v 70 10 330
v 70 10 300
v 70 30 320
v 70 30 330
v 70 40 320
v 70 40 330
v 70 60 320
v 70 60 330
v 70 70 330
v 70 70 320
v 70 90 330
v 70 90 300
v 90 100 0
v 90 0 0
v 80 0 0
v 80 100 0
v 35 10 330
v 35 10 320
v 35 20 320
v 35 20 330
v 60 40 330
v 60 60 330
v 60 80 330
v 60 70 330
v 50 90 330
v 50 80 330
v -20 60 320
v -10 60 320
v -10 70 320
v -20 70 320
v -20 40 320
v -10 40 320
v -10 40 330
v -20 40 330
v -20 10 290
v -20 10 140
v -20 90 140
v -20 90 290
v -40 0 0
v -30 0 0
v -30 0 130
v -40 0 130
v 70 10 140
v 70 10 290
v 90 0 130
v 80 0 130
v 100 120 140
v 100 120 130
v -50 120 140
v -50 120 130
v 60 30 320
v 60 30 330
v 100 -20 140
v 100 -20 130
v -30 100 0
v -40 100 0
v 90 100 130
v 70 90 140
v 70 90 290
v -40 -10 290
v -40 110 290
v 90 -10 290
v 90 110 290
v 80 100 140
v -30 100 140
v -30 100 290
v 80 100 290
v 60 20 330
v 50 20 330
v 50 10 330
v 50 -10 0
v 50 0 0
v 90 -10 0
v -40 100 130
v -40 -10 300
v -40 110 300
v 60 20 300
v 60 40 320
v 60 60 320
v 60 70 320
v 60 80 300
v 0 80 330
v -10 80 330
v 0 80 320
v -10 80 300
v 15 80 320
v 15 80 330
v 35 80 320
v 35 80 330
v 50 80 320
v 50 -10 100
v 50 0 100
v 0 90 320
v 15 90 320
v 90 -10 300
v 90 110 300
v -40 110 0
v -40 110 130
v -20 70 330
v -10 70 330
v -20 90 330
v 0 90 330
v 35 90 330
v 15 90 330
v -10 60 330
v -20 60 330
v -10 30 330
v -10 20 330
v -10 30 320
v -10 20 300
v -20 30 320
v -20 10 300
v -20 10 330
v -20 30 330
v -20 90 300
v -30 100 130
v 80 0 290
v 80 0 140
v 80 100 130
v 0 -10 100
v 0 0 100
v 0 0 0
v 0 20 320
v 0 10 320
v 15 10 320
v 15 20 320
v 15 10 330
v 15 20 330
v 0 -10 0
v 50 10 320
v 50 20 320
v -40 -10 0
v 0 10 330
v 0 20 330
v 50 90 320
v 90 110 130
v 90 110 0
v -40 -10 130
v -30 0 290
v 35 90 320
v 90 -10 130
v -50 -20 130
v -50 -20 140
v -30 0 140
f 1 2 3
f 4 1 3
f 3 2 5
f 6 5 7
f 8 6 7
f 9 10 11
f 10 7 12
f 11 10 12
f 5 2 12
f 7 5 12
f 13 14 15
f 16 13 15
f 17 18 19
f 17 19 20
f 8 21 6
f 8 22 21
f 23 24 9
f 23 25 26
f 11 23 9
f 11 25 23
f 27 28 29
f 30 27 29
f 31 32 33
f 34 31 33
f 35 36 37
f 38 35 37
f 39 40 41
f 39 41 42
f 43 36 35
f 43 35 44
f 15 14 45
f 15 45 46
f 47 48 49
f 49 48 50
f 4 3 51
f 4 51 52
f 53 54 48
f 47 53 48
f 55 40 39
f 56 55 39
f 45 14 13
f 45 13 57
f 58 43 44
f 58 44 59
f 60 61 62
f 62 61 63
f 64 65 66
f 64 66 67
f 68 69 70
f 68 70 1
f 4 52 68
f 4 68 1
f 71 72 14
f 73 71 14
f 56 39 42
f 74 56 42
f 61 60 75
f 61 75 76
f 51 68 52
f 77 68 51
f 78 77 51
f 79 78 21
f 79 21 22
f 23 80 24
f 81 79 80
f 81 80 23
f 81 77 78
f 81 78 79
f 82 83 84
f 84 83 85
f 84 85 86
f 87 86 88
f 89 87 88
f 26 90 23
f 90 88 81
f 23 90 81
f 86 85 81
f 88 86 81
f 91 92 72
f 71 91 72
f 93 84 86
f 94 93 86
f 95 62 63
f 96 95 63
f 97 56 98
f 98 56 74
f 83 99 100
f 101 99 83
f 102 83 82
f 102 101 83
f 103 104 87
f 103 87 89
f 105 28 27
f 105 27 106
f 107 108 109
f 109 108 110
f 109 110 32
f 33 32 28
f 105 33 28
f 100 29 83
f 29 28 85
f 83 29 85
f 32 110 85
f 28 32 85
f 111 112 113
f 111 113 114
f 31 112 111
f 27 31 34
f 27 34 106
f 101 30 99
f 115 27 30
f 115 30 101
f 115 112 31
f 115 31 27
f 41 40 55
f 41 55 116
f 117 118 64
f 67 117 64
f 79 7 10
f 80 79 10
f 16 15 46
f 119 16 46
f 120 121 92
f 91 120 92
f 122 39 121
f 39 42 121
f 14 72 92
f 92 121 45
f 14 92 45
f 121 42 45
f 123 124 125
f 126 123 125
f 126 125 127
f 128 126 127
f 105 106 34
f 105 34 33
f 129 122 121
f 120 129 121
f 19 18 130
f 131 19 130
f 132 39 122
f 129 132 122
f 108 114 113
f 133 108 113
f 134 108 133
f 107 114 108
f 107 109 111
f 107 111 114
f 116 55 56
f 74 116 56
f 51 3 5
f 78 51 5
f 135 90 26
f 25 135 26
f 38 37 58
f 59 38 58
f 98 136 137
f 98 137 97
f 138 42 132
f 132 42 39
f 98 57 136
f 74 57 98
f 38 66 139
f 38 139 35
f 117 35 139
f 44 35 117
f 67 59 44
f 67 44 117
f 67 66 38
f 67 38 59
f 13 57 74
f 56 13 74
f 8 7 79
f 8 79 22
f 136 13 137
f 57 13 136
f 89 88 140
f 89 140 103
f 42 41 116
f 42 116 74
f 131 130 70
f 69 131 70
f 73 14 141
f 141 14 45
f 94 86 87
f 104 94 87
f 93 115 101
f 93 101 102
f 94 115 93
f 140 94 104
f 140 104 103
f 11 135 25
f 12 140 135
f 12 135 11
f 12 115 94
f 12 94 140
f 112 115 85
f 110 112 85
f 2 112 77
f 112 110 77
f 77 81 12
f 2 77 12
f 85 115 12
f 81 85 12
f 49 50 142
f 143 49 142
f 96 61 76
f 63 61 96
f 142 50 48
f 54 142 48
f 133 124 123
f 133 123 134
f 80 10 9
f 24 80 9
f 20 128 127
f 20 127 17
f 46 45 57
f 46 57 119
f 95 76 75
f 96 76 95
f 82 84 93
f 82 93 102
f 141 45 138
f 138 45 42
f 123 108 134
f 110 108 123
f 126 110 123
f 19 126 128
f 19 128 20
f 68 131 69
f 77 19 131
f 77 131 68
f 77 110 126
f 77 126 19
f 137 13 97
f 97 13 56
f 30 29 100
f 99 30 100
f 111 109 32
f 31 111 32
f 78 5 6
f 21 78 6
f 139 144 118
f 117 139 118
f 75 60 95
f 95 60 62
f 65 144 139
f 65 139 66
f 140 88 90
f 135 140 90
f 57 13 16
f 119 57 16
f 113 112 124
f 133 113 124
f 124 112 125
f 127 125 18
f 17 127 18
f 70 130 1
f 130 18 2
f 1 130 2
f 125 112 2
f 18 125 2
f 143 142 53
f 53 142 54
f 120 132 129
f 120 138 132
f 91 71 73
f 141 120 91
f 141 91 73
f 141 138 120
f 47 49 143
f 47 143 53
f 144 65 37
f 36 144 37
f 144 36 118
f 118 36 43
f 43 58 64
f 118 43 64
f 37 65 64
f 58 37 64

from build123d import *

# Parameters (mm, degrees)
F1_DEPTH  = 10
F2_W      = 10
F2_H      = 130
F3_DEPTH  = 100
F4_W      = 130
F4_H      = 130
F5_DEPTH  = 10
F7_DEPTH  = 10
F8_W      = 110
F8_H      = 100
F8_W_2    = 90
F8_H_2    = 80
F9_DEPTH  = 150
F10_W     = 130
F10_H     = 120
F11_DEPTH = 10
F12_W     = 90
F12_H     = 80
F12_W_2   = 70
F12_H_2   = 60
F13_DEPTH = 30
F14_W     = 15
F14_H     = 10
F15_DEPTH = 110.001
F16_W     = 10
F16_H     = 10
F17_DEPTH = 120.001


with BuildPart() as f1:
    # F0 (on Front) → F1 (new body)
    with BuildSketch(Plane.XZ):
        Polygon((-40, 0), (0, 0), (0, 100), (50, 100), (50, 0), (90, 0), (90, 130), (-40, 130), align=None)
    extrude(amount=F1_DEPTH)


with BuildPart() as f3:
    # F2 (on face) → F3 (new body)
    with BuildSketch(Plane(origin=(0, 0, 0), x_dir=(-1, 0, 0), z_dir=(0, 1, 0))):
        with Locations((-85, 65)):
            Rectangle(F2_W, F2_H)
        with Locations((35, 65)):
            Rectangle(F2_W, F2_H)
    extrude(amount=F3_DEPTH)


with BuildPart() as f5:
    # F4 (on face) → F5 (new body)
    with BuildSketch(Plane(origin=(0, 100, 0), x_dir=(-1, 0, 0), z_dir=(0, 1, 0))):
        with Locations((-25, 65)):
            Rectangle(F4_W, F4_H)
    extrude(amount=F5_DEPTH)


with BuildPart() as f7:
    # F6 (on face) → F7 (new body)
    with BuildSketch(Plane.XY.offset(130)):
        Polygon((100, 120), (-50, 120), (-50, 100), (-50, 0), (-50, -20), (100, -20), (100, 0), (100, 100), align=None)
    extrude(amount=F7_DEPTH)


with BuildPart() as f9:
    # F8 (on face) → F9 (new body)
    with BuildSketch(Plane.XY.offset(140)):
        with Locations((25, 50)):
            Rectangle(F8_W, F8_H)
        with Locations((25, 50)):
            Rectangle(F8_W_2, F8_H_2, mode=Mode.SUBTRACT)
    extrude(amount=F9_DEPTH)


with BuildPart() as f11:
    # F10 (on face) → F11 (new body)
    with BuildSketch(Plane.XY.offset(290)):
        with Locations((25, 50)):
            Rectangle(F10_W, F10_H)
    extrude(amount=F11_DEPTH)


with BuildPart() as f13:
    # F12 (on face) → F13 (new body)
    with BuildSketch(Plane.XY.offset(300)):
        with Locations((25, 50)):
            Rectangle(F12_W, F12_H)
        with Locations((25, 50)):
            Rectangle(F12_W_2, F12_H_2, mode=Mode.SUBTRACT)
    extrude(amount=F13_DEPTH)

    # F14 (on face) → F15 (cut, through all)
    with BuildSketch(Plane.XZ.offset(-10)):
        with Locations((7.5, 325)):
            Rectangle(F14_W, F14_H)
        with Locations((42.5, 325)):
            Rectangle(F14_W, F14_H)
    extrude(amount=-F15_DEPTH, mode=Mode.SUBTRACT)

    # F16 (on face) → F17 (cut, through all)
    with BuildSketch(Plane.YZ.offset(70)):
        with Locations((35, 325)):
            Rectangle(F16_W, F16_H)
        with Locations((65, 325)):
            Rectangle(F16_W, F16_H)
    extrude(amount=-F17_DEPTH, mode=Mode.SUBTRACT)


solid = Compound([f1.part, f3.part, f5.part, f7.part, f9.part, f11.part, f13.part])
